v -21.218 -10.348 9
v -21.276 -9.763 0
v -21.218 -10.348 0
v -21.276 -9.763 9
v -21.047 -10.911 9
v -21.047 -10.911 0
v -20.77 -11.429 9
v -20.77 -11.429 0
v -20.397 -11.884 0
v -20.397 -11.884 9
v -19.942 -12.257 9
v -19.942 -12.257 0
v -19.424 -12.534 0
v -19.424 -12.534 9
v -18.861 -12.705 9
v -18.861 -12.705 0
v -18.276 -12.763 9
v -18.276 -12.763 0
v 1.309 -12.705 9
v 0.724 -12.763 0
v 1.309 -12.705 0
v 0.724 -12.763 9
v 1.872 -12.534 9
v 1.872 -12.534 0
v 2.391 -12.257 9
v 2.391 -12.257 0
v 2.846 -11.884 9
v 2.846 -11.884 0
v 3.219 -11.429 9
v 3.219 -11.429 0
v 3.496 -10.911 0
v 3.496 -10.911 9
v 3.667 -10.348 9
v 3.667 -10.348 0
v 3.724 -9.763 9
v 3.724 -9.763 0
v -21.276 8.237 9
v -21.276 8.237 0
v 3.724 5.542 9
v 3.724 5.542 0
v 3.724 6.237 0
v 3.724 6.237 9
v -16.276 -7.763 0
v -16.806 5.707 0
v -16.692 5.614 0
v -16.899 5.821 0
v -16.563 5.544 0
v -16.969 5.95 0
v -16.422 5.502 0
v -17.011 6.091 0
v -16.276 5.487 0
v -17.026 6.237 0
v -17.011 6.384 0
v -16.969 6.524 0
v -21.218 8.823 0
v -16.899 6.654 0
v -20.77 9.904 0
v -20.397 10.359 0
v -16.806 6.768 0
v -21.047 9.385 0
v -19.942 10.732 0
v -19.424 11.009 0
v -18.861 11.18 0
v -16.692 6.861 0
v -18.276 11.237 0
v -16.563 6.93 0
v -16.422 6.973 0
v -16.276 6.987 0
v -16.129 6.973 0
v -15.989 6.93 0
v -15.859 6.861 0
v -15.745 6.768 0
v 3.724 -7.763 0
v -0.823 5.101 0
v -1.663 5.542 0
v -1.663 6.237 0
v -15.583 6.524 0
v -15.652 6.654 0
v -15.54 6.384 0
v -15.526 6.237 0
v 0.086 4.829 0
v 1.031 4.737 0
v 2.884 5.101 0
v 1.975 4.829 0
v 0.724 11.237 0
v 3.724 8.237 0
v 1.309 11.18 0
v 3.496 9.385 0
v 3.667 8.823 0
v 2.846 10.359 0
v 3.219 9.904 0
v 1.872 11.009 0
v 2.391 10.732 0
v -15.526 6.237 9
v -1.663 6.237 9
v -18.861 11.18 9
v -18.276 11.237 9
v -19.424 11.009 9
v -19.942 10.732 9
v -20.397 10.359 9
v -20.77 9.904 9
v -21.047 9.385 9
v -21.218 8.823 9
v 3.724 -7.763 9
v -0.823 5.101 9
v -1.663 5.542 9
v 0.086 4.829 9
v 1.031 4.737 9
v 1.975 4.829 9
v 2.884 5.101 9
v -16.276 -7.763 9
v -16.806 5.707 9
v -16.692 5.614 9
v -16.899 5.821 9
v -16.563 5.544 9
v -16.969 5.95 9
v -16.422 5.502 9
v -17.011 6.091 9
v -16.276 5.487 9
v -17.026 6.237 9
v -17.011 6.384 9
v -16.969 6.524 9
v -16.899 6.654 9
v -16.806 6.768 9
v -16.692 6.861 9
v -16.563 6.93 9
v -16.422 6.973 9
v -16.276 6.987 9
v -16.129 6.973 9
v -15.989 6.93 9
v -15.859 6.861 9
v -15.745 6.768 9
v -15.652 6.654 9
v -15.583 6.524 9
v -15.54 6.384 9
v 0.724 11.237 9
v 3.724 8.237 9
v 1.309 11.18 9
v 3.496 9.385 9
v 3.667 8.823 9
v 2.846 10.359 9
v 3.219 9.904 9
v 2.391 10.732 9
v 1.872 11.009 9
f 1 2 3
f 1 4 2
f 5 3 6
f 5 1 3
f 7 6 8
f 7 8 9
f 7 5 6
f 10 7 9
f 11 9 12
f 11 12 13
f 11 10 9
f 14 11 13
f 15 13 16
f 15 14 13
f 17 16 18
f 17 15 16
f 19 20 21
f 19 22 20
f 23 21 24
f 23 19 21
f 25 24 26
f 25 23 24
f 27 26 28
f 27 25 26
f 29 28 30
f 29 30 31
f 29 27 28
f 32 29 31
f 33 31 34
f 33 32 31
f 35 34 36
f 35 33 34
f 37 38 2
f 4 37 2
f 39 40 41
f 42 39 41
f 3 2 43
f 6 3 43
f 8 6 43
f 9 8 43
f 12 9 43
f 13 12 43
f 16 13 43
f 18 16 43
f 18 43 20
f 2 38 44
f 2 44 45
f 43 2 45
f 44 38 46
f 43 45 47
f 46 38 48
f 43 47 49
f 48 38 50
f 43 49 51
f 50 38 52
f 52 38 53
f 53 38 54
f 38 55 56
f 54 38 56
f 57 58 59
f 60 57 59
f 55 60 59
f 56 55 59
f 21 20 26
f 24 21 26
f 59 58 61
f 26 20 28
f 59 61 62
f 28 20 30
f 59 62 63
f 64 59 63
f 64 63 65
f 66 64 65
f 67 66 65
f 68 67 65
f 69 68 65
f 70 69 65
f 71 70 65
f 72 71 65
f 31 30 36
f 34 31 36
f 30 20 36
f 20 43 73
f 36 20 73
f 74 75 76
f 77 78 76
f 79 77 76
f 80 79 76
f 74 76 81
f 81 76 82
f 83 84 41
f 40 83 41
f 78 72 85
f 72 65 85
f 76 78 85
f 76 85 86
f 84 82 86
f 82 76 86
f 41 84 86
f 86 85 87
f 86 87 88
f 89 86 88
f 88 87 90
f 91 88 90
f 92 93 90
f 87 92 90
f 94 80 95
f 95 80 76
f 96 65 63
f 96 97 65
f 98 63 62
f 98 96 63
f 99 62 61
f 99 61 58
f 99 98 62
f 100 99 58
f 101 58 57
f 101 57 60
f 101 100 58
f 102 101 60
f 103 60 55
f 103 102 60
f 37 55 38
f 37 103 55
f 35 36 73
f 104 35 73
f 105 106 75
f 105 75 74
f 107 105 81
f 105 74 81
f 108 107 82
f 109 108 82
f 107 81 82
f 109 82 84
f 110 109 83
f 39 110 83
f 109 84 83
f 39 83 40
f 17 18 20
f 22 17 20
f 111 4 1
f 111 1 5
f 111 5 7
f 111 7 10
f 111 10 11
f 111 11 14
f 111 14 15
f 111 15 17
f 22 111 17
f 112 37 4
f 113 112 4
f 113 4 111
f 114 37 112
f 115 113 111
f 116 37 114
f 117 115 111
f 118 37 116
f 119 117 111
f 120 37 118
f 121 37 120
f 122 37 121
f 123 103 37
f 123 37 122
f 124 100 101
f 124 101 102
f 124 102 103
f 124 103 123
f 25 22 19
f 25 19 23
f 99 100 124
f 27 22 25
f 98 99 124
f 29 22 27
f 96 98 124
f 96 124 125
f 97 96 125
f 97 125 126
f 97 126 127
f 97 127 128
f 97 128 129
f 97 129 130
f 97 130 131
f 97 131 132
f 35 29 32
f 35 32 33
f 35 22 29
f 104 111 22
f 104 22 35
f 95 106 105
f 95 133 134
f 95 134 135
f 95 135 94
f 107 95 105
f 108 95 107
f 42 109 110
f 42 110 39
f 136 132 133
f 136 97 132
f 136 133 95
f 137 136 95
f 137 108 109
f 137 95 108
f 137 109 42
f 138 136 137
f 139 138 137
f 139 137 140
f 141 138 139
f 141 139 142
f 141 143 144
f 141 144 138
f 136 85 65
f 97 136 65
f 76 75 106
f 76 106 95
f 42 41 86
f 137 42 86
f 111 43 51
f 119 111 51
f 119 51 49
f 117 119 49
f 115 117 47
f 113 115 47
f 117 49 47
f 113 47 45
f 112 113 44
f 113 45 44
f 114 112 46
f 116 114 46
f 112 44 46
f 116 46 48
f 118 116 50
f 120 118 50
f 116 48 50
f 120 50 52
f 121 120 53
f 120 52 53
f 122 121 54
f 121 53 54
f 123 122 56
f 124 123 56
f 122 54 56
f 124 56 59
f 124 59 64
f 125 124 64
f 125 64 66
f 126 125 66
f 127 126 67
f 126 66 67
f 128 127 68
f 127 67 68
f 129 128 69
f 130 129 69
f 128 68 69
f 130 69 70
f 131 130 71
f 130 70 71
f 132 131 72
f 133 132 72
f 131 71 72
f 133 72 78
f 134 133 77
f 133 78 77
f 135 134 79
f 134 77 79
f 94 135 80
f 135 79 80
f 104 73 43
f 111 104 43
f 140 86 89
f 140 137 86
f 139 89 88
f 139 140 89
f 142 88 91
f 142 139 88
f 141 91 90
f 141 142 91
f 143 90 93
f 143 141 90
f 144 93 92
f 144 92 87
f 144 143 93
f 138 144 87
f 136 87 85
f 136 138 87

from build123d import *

# Parameters (mm, degrees)
F0_W     = 5.387183
F0_H     = 0.69484
F1_DEPTH = 9
F2_R     = 3


with BuildPart() as f1:
    # F0 (on Top) → F1 (new body)
    with BuildSketch(Plane.XY):
        with BuildLine():
            ThreePointArc((-1.662956, 5.542424), (1.030635, 4.737264), (3.724227, 5.542424))
            Line((3.724227, 5.542424), (-1.662956, 5.542424))
        make_face()
        with Locations((1.030636, 5.889844)):
            Rectangle(F0_W, F0_H)
        with BuildLine():
            Line((3.724227, 6.237264), (3.724227, 11.237264))
            Line((3.724227, 11.237264), (-21.275773, 11.237264))
            Line((-21.275773, 11.237264), (-21.275773, -12.762736))
            Line((-21.275773, -12.762736), (3.724227, -12.762736))
            Line((3.724227, -12.762736), (3.724227, -7.762736))
            Line((3.724227, -7.762736), (-16.275773, -7.762736))
            Line((-16.275773, -7.762736), (-16.275773, 5.487264))
            ThreePointArc((-16.275773, 5.487264), (-16.806103, 6.767594), (-15.525773, 6.237264))
            Line((-15.525773, 6.237264), (-1.662956, 6.237264))
            Line((-1.662956, 6.237264), (3.724227, 6.237264))
        make_face()
    extrude(amount=F1_DEPTH)

    # F2
    f2_edges = [f1.edges().sort_by_distance(p)[0] for p in [
        (-21.275773, 11.237264, 4.5),
        (-21.275773, -12.762736, 4.5),
        (3.724227, 11.237264, 4.5),
        (3.724227, -12.762736, 4.5),
    ]]
    fillet(f2_edges, radius=F2_R)


solid = f1.part
